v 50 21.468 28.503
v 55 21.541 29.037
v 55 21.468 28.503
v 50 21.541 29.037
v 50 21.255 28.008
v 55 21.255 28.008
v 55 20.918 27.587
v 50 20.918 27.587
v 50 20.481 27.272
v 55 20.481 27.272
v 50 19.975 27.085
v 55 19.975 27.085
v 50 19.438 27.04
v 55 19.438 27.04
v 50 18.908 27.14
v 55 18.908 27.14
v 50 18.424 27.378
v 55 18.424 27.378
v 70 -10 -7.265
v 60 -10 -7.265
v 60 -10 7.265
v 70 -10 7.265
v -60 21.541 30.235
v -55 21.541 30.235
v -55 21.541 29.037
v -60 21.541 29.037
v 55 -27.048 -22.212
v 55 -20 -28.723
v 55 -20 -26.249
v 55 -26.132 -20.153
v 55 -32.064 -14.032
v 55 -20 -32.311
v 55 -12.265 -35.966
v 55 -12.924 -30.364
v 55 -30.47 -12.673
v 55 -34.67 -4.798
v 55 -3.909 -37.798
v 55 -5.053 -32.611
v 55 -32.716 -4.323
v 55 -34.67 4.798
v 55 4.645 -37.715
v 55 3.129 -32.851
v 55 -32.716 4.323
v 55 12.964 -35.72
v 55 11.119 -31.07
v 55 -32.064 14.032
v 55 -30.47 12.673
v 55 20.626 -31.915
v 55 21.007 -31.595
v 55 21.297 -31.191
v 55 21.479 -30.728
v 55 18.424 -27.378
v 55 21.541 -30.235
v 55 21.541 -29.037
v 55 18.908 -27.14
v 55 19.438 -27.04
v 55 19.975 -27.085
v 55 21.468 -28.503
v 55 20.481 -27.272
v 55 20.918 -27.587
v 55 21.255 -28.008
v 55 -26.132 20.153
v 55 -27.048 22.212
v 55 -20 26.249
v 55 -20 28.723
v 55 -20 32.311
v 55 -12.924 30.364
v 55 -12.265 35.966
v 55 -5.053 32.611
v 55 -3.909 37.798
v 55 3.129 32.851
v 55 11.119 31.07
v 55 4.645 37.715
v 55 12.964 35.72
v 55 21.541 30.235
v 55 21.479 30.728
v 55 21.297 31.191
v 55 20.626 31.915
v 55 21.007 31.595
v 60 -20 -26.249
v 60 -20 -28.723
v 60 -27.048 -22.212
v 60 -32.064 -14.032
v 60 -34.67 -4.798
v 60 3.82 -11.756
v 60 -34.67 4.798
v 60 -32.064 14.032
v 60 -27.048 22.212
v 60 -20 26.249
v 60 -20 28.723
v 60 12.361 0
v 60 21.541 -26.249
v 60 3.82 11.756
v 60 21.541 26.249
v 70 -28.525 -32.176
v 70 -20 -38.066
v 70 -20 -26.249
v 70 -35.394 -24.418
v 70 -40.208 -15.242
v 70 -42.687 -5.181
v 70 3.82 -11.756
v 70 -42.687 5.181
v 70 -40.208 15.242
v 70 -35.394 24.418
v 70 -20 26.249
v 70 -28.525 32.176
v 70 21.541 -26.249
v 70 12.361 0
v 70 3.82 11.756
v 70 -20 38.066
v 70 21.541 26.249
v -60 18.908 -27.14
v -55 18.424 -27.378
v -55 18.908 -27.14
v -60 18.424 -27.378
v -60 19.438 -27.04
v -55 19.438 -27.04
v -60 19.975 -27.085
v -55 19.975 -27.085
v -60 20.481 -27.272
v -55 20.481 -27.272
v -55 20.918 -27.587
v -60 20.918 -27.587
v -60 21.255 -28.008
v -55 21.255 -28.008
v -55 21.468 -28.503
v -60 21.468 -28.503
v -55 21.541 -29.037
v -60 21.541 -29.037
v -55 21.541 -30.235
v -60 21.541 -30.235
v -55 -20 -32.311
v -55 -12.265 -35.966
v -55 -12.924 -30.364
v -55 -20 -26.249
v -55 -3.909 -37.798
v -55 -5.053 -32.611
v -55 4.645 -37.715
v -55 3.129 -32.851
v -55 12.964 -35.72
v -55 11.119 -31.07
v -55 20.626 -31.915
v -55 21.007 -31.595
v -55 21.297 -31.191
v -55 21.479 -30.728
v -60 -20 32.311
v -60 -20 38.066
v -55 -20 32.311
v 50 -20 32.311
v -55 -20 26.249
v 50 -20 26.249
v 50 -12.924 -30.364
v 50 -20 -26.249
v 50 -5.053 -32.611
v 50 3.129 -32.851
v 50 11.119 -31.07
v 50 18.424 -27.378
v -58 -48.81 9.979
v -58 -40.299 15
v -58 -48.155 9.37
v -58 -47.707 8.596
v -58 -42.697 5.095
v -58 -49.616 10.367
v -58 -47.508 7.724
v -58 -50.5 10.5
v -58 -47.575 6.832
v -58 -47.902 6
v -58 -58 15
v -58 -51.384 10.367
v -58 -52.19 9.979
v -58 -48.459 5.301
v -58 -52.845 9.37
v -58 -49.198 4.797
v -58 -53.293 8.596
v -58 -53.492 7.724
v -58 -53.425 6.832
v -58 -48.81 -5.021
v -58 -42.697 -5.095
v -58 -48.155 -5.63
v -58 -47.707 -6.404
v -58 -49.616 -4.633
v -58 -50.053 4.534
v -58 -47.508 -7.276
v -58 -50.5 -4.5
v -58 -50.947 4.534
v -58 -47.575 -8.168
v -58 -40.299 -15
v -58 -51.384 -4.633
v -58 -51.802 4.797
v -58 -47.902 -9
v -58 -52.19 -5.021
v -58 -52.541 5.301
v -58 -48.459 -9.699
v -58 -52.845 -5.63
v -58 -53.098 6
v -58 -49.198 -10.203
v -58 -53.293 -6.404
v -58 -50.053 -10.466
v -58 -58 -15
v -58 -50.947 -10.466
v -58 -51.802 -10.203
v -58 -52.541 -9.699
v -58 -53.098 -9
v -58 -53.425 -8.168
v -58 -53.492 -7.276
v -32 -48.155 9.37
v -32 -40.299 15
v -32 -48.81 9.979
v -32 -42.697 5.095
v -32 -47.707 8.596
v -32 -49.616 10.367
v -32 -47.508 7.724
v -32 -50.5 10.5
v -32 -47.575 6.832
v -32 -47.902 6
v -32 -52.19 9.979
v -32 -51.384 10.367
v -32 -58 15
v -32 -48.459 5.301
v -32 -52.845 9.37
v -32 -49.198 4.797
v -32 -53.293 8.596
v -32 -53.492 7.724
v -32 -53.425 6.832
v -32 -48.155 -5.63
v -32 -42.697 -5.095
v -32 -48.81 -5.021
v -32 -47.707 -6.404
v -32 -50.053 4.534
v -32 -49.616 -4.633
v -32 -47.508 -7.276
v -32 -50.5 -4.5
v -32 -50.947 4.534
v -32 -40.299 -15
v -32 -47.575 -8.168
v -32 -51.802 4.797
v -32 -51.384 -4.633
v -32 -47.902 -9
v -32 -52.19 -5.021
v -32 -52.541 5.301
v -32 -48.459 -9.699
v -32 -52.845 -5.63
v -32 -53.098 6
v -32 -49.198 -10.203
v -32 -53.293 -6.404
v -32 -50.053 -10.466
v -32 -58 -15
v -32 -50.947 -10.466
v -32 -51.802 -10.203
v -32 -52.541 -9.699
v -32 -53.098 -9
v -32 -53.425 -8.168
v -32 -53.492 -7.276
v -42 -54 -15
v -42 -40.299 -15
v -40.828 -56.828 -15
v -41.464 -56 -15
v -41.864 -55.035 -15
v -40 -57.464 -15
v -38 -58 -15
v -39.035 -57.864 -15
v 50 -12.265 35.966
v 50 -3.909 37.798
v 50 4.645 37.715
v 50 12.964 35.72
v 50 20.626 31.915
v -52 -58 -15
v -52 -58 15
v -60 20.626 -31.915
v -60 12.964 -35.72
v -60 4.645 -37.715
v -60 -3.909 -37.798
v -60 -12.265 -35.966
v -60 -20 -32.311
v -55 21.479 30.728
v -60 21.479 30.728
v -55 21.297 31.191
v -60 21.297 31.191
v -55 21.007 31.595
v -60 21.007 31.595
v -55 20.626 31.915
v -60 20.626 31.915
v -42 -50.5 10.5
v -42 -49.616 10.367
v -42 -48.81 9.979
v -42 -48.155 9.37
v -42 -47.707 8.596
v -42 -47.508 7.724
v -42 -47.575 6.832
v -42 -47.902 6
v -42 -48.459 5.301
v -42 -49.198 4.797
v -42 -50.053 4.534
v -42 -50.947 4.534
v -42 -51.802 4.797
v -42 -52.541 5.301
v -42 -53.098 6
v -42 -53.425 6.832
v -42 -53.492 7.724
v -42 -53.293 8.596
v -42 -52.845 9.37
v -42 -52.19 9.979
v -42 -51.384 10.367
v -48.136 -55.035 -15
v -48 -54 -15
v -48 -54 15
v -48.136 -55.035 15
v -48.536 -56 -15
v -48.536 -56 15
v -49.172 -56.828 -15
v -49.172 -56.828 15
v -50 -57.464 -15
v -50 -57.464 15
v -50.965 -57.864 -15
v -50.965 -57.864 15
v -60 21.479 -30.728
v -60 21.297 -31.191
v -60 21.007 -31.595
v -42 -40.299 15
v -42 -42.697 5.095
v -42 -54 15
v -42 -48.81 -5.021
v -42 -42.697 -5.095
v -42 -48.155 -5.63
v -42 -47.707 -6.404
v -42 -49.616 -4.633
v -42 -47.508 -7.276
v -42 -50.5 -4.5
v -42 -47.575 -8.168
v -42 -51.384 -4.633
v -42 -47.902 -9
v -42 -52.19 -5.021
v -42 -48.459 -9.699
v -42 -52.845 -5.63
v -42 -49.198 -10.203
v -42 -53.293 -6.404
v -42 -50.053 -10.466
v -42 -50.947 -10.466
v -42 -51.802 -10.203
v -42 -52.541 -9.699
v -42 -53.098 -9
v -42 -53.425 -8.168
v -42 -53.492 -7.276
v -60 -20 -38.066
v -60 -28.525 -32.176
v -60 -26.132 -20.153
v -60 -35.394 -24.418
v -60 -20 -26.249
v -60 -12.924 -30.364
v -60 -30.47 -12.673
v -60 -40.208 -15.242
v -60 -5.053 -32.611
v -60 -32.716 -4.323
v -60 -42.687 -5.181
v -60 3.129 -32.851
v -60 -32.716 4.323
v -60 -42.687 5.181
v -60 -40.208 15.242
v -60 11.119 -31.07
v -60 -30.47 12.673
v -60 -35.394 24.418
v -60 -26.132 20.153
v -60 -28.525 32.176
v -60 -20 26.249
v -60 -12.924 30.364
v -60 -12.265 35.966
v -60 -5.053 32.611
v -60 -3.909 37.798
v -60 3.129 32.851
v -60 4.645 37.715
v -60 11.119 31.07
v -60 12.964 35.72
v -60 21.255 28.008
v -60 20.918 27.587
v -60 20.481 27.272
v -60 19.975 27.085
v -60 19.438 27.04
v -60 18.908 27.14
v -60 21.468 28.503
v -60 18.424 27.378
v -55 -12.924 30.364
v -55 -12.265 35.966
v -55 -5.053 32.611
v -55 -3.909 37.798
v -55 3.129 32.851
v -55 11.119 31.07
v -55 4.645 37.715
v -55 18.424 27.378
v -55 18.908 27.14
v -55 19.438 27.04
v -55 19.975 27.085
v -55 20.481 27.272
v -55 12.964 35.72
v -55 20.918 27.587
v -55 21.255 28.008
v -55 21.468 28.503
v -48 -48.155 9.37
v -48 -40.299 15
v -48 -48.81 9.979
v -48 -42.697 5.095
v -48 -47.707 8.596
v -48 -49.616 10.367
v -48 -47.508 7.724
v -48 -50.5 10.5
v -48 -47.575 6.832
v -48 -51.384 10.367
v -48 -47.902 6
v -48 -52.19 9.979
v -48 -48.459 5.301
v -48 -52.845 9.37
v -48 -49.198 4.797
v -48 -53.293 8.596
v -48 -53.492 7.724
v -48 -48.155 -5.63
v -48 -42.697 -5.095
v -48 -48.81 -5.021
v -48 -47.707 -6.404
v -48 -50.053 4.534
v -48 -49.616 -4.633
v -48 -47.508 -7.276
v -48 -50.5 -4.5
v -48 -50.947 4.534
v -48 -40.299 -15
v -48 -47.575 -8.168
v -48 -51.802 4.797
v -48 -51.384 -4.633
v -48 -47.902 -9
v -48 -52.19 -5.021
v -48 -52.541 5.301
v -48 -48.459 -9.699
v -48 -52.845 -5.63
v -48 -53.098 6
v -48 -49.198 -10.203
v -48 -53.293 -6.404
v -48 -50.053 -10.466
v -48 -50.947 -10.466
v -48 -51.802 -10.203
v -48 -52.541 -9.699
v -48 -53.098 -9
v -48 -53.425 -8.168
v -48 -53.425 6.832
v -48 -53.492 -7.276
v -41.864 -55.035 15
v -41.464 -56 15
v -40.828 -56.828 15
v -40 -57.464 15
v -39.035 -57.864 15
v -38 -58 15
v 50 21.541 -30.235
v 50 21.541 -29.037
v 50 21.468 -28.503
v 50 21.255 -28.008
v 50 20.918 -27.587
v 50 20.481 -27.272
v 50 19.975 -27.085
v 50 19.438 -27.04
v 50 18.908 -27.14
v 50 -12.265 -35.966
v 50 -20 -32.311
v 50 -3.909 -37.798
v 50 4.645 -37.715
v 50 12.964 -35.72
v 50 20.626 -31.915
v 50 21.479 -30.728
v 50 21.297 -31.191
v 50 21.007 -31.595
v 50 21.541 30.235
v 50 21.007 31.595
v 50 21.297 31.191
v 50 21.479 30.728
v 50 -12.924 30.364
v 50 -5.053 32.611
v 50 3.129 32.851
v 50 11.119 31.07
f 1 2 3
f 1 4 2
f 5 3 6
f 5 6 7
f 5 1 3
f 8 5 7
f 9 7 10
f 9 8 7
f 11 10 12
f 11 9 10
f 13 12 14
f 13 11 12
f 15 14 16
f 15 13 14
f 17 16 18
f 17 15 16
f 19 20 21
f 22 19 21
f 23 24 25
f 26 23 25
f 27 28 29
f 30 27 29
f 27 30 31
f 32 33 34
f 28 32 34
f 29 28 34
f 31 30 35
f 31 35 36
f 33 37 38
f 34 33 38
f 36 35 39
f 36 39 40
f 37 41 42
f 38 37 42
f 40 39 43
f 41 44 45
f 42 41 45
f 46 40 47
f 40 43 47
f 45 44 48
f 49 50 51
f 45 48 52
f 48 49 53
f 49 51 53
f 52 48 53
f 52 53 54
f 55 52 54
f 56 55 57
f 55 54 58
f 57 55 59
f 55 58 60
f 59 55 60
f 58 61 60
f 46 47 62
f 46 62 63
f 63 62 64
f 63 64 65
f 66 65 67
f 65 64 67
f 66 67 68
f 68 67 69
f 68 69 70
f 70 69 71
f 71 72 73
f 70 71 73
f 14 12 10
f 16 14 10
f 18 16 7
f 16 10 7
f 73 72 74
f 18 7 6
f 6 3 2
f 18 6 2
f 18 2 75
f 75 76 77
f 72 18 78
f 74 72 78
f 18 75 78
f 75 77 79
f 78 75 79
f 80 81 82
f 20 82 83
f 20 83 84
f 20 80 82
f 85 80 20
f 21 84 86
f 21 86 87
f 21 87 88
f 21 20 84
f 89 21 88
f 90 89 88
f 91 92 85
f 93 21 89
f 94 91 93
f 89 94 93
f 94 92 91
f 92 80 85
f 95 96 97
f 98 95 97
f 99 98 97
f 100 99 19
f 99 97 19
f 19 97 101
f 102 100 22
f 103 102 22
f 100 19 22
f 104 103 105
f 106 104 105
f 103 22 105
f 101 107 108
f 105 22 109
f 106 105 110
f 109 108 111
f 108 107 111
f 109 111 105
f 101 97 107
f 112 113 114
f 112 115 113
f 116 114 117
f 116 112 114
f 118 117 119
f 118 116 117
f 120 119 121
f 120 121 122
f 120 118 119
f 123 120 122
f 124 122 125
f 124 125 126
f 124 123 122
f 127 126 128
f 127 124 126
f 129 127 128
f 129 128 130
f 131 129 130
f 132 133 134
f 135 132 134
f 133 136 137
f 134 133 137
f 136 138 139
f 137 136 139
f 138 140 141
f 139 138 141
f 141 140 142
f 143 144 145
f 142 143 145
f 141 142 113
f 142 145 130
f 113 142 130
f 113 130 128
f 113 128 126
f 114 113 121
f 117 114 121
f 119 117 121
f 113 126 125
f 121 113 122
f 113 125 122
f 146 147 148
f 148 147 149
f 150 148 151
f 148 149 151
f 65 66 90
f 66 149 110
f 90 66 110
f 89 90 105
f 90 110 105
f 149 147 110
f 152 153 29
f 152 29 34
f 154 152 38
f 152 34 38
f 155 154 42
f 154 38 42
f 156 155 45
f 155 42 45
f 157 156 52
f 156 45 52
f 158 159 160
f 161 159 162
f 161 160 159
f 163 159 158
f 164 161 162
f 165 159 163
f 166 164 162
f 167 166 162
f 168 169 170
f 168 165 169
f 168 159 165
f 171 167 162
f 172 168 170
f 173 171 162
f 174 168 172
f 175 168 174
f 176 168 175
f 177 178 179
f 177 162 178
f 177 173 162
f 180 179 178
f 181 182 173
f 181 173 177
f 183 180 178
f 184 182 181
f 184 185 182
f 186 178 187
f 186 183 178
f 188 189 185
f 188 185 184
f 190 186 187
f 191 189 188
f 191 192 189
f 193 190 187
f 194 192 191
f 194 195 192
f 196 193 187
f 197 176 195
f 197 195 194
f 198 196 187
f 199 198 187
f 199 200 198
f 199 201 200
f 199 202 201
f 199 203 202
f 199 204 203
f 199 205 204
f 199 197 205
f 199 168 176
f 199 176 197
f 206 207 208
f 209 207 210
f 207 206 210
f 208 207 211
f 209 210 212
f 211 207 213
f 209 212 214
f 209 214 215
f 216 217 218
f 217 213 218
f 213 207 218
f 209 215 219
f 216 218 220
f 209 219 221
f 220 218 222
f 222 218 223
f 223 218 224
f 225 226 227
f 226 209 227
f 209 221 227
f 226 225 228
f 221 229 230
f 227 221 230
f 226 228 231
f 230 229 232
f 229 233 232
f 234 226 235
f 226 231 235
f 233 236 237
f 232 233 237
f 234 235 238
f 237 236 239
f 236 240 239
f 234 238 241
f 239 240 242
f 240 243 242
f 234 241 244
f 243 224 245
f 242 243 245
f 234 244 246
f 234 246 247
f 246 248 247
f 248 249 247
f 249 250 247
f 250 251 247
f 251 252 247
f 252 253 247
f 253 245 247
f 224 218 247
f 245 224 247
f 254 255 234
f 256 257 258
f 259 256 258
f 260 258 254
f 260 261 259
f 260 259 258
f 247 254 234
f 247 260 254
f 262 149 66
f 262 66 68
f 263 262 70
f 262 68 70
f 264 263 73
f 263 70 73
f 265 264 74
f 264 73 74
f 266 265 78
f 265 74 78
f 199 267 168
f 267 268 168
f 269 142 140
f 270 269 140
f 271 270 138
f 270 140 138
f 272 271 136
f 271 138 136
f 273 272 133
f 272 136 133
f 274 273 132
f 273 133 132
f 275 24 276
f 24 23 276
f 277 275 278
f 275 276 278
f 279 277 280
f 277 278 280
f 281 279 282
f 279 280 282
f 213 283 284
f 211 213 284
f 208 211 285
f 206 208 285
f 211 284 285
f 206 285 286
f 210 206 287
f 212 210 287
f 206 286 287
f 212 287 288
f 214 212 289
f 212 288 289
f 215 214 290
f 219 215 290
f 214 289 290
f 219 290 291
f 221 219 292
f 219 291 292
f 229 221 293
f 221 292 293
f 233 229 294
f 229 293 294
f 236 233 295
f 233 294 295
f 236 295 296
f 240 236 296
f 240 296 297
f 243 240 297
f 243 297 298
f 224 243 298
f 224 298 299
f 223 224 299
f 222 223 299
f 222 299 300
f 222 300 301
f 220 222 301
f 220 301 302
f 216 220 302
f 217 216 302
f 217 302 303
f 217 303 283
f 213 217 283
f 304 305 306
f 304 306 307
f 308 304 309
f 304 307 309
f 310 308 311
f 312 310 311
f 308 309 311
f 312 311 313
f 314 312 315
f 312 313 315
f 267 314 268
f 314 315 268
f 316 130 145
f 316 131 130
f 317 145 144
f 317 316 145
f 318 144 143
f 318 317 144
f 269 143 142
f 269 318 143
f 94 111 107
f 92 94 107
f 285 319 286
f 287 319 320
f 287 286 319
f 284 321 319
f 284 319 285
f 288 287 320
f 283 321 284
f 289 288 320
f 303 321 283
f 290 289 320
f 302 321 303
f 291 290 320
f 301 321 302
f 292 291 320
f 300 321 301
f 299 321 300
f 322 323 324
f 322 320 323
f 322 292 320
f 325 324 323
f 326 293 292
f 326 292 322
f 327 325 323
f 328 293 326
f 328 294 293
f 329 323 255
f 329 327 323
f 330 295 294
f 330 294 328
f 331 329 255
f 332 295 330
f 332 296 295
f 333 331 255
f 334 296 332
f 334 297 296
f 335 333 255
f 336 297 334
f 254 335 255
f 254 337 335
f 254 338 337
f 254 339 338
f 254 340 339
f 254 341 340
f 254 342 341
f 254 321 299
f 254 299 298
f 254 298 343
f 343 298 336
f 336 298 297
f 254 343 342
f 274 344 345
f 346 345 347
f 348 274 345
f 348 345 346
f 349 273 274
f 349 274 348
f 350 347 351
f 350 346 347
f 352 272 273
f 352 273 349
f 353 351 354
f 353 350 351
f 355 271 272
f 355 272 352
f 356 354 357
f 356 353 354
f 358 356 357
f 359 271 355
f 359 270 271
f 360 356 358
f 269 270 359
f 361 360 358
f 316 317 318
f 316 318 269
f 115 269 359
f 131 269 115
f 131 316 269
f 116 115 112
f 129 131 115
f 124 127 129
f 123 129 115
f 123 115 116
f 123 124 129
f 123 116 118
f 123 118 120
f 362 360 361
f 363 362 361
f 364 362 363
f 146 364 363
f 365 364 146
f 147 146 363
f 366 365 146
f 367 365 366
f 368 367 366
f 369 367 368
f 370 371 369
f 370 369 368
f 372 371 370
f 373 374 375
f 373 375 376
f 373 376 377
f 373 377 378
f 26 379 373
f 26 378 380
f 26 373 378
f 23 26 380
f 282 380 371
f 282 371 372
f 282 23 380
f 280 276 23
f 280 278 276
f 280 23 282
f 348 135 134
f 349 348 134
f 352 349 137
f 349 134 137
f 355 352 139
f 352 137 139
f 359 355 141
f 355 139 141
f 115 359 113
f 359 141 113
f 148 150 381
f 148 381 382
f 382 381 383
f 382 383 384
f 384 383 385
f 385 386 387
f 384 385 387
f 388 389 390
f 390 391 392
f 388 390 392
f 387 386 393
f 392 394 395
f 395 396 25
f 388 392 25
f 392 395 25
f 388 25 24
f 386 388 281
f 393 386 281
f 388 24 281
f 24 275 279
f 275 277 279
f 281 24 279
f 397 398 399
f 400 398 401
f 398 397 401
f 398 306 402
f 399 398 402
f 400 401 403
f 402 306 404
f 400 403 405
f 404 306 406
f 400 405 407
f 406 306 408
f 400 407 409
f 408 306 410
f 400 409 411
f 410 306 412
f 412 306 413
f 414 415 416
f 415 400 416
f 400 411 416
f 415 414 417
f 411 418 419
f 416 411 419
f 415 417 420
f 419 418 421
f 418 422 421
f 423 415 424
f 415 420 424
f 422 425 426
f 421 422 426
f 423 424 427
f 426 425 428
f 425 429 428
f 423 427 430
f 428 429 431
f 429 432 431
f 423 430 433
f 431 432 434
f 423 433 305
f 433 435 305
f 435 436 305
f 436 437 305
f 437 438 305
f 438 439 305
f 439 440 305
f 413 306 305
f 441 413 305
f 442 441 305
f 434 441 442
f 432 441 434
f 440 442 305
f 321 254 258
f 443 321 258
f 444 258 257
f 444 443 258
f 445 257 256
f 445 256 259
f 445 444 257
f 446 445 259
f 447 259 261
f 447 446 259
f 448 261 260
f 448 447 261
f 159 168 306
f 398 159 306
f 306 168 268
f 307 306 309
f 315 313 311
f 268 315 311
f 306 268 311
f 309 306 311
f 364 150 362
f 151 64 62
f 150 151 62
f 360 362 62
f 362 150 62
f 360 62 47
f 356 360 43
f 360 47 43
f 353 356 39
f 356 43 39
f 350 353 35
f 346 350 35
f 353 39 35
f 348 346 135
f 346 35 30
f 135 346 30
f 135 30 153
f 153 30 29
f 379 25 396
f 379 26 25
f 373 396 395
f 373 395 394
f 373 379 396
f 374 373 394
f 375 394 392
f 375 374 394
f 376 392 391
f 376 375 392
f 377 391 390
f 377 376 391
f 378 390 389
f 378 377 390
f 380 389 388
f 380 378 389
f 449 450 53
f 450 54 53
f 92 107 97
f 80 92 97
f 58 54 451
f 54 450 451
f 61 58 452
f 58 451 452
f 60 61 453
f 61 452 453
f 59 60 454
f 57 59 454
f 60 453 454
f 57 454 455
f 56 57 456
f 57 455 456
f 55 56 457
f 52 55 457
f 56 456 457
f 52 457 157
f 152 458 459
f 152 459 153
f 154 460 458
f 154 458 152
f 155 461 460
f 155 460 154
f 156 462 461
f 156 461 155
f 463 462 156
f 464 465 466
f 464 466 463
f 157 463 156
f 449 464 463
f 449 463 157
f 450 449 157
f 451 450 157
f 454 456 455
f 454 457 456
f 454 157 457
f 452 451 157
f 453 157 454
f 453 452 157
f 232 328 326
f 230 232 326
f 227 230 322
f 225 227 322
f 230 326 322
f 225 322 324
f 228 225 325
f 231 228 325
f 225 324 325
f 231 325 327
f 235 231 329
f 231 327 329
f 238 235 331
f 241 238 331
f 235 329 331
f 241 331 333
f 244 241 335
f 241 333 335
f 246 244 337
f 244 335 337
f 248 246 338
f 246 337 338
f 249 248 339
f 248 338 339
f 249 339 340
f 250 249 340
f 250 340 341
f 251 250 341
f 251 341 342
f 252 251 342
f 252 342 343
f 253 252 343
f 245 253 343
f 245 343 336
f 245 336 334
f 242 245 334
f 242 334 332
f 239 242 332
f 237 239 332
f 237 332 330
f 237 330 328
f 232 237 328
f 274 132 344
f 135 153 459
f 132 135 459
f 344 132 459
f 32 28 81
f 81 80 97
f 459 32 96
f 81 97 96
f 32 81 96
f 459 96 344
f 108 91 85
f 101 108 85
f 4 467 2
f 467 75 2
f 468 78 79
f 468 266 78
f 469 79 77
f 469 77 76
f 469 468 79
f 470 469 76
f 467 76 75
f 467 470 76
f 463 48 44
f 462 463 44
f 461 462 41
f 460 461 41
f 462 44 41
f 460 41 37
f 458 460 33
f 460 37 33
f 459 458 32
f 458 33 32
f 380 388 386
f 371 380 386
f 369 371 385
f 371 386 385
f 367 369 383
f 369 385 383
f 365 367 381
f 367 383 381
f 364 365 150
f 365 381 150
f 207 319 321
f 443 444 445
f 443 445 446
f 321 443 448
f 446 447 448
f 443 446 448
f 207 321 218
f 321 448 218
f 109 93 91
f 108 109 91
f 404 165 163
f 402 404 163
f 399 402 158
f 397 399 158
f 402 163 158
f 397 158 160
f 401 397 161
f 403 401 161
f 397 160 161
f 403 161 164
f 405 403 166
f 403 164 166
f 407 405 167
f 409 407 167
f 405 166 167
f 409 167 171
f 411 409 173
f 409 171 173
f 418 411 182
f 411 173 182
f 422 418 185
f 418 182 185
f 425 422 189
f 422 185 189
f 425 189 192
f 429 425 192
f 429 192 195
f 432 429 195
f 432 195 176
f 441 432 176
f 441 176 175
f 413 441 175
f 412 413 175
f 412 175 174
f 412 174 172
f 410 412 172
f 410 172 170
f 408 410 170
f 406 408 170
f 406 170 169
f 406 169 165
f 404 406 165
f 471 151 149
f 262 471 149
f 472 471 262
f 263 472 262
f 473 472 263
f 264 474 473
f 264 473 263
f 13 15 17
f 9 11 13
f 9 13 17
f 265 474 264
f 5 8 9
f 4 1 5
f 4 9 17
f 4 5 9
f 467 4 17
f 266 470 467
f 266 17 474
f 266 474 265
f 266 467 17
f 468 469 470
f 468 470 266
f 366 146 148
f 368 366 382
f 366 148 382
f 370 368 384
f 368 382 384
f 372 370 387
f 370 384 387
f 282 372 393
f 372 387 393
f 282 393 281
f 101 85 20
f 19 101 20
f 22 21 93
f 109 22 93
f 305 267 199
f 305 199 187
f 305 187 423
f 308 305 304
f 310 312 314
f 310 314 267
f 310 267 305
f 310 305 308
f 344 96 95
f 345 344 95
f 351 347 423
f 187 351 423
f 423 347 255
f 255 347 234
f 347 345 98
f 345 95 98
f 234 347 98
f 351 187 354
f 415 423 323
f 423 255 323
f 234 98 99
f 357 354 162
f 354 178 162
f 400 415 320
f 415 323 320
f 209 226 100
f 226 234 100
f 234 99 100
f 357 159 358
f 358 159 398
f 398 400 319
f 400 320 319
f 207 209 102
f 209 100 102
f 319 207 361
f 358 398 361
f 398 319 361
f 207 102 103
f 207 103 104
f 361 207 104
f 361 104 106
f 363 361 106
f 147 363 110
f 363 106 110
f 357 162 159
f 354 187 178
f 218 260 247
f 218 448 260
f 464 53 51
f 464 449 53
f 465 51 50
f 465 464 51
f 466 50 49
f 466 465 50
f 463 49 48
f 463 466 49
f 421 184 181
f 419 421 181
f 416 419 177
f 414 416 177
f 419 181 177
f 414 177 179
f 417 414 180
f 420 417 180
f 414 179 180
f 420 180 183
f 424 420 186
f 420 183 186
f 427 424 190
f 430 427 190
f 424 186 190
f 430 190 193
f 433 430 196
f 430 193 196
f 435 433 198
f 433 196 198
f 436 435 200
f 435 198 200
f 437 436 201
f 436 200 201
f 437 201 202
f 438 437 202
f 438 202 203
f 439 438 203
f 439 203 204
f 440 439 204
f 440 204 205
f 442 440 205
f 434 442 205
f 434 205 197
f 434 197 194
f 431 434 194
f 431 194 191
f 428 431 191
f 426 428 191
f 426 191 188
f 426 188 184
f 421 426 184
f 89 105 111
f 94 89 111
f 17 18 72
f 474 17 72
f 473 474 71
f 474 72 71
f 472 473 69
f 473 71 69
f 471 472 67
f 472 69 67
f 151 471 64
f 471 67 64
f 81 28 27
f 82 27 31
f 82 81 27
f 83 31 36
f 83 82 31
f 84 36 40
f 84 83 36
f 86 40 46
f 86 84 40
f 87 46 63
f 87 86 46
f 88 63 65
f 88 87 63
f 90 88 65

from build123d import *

# Parameters (mm, degrees)
BOSS_EXTRUDE1_DEPTH      = 60
BOSS_EXTRUDE2_START      = -5
BOSS_EXTRUDE2_DEPTH      = 5
BOSS_EXTRUDE3_START      = 10
BOSS_EXTRUDE3_DEPTH      = 10
BOSS_EXTRUDE4_DEPTH      = 15
BOSS_EXTRUDE4_2_DEPTH    = 15
BOSS_EXTRUDE6_REACH      = 104.54
BOSS_EXTRUDE6_END_RADIUS = 43
SKETCH5_W                = 10
SKETCH5_H                = 30
CUT_EXTRUDE1_REACH       = 147.592
SKETCH6_R                = 3
SKETCH7_R                = 35
CUT_EXTRUDE2_DEPTH       = 5
LPATTERN1_COUNT          = 2
LPATTERN1_PITCH          = 110
FILLET1_R                = 2
CUT_EXTRUDE3_REACH       = 140.611


with BuildPart() as part:
    # Sketch1 → Boss-Extrude1 (new, symmetric)
    with BuildSketch(Plane(origin=(0, 0, 0), x_dir=(0, 0, -1), z_dir=(1, 0, 0))):
        with BuildLine():
            Line((-38.065732621, -20), (-26.248809497, -20))
            ThreePointArc((-26.248809497, -20), (0, -33), (26.248809497, -20))
            Line((26.248809497, -20), (38.065732621, -20))
            ThreePointArc((38.065732621, -20), (0, -43), (-38.065732621, -20))
        make_face()
    extrude(amount=BOSS_EXTRUDE1_DEPTH, both=True)

    # Sketch2 → Boss-Extrude2 (add)
    with BuildSketch(Plane(origin=(60, 0, 0), x_dir=(0, 0, -1), z_dir=(1, 0, 0)).offset(BOSS_EXTRUDE2_START)):
        with BuildLine():
            Line((-31.304951685, 21.540659229), (-25, 21.540659229))
            ThreePointArc((-25, 21.540659229), (0, -33), (25, 21.540659229))
            Line((25, 21.540659229), (31.304951685, 21.540659229))
            ThreePointArc((31.304951685, 21.540659229), (0, -38), (-31.304951685, 21.540659229))
        make_face()
    boss_extrude2 = extrude(amount=-BOSS_EXTRUDE2_DEPTH)

    # Sketch3 → Boss-Extrude3 (add)
    with BuildSketch(Plane(origin=(60, 0, 0), x_dir=(0, 0, -1), z_dir=(1, 0, 0)).offset(BOSS_EXTRUDE3_START)):
        with BuildLine():
            Line((-26.248809497, -20), (-26.248809497, 21.540659229))
            Line((-26.248809497, 21.540659229), (26.248809497, 21.540659229))
            Line((26.248809497, 21.540659229), (26.248809497, -20))
            Line((26.248809497, -20), (38.065732621, -20))
            ThreePointArc((38.065732621, -20), (0, -43), (-38.065732621, -20))
            Line((-38.065732621, -20), (-26.248809497, -20))
        make_face()
    extrude(amount=-BOSS_EXTRUDE3_DEPTH)



with BuildPart() as body_2:
    # Sketch4 → Boss-Extrude4 (new, symmetric)
    with BuildSketch(Plane.XY):
        with BuildLine():
            Line((-48, -43), (-48, -54))
            ThreePointArc((-48, -54), (-49.171572875, -56.828427125), (-52, -58))
            Line((-52, -58), (-58, -58))
            Line((-58, -58), (-58, -43))
            Line((-58, -43), (-48, -43))
        make_face()
    extrude(amount=BOSS_EXTRUDE4_DEPTH, both=True)


with BuildPart() as body_3:
    # Sketch4 → Boss-Extrude4 2 (new, symmetric)
    with BuildSketch(Plane.XY):
        with BuildLine():
            Line((-32, -43), (-42, -43))
            Line((-42, -43), (-42, -54))
            ThreePointArc((-42, -54), (-40.828427125, -56.828427125), (-38, -58))
            Line((-38, -58), (-32, -58))
            Line((-32, -58), (-32, -43))
        make_face()
    extrude(amount=BOSS_EXTRUDE4_2_DEPTH, both=True)


with BuildPart() as part_1:
    add(part.part)

    add(body_2.part)  # Boss-Extrude6 merges body 2

    add(body_3.part)  # Boss-Extrude6 merges body 3
    # Boss-Extrude6: up to this cylinder (the profile starts outside it)
    boss_extrude6_end = Plane(origin=(-45, 0, 0), z_dir=(-1, 0, 0)) * Cylinder(BOSS_EXTRUDE6_END_RADIUS, 312.08, mode=Mode.PRIVATE)
    # Sketch5 → Boss-Extrude6 (add, up to the surface)
    with BuildSketch(Plane(origin=(0, -43, 0), x_dir=(1, 0, 0), z_dir=(0, 1, 0)), mode=Mode.PRIVATE) as boss_extrude6_sk1:
        with Locations((-37, 0)):
            Rectangle(SKETCH5_W, SKETCH5_H)
    boss_extrude6_tool1 = extrude(boss_extrude6_sk1.sketch, amount=BOSS_EXTRUDE6_REACH, mode=Mode.PRIVATE) - boss_extrude6_end
    add(boss_extrude6_tool1.solids().sort_by_distance((-37, -43, 0))[0])
    add(boss_extrude6_tool1.solids().sort_by_distance((-37, -43, 0))[1])
    # Sketch5 → Boss-Extrude6 (add, up to the surface)
    with BuildSketch(Plane(origin=(0, -43, 0), x_dir=(1, 0, 0), z_dir=(0, 1, 0)), mode=Mode.PRIVATE) as boss_extrude6_sk2:
        with Locations((-53, 0)):
            Rectangle(SKETCH5_W, SKETCH5_H)
    boss_extrude6_tool2 = extrude(boss_extrude6_sk2.sketch, amount=BOSS_EXTRUDE6_REACH, mode=Mode.PRIVATE) - boss_extrude6_end
    add(boss_extrude6_tool2.solids().sort_by_distance((-53, -43, 0))[0])
    add(boss_extrude6_tool2.solids().sort_by_distance((-53, -43, 0))[1])

    # Cut-Extrude1: up to this face of the body (flat: up to its plane)
    cut_extrude1_end = Plane(part_1.part.faces().sort_by_distance((-32, -50.035411039, 0))[0])
    # Sketch6 → Cut-Extrude1 (cut, up to the picked face)
    with BuildSketch(Plane.ZY.offset(58), mode=Mode.PRIVATE) as cut_extrude1_sk1:
        with Locations((-7.5, -50.5)):
            Circle(SKETCH6_R)
    cut_extrude1_tool1 = split(extrude(cut_extrude1_sk1.sketch, amount=-CUT_EXTRUDE1_REACH, mode=Mode.PRIVATE), bisect_by=cut_extrude1_end, keep=Keep.BOTH, mode=Mode.PRIVATE)
    # Sketch6 → Cut-Extrude1 (cut, up to the picked face)
    with BuildSketch(Plane.ZY.offset(58), mode=Mode.PRIVATE) as cut_extrude1_sk2:
        with Locations((7.5, -50.5)):
            Circle(SKETCH6_R)
    cut_extrude1_tool2 = split(extrude(cut_extrude1_sk2.sketch, amount=-CUT_EXTRUDE1_REACH, mode=Mode.PRIVATE), bisect_by=cut_extrude1_end, keep=Keep.BOTH, mode=Mode.PRIVATE)
    add(cut_extrude1_tool1.solids().sort_by(Axis((-58, -50.5, -7.5), (1, 0, 0)))[0], mode=Mode.SUBTRACT)
    add(cut_extrude1_tool2.solids().sort_by(Axis((-58, -50.5, 7.5), (1, 0, 0)))[0], mode=Mode.SUBTRACT)

    # Sketch7 → Cut-Extrude2 (cut)
    with BuildSketch(Plane.ZY.offset(-60)):
        Circle(SKETCH7_R)
    extrude(amount=CUT_EXTRUDE2_DEPTH, mode=Mode.SUBTRACT)

    # LPattern1: Boss-Extrude2 ×2
    with Locations(*[(-i * LPATTERN1_PITCH, 0, 0) for i in range(1, LPATTERN1_COUNT)]):
        add(boss_extrude2)

    # Fillet1
    fillet1_edges = [part_1.edges().sort_by_distance(p)[0] for p in [
        (52.5, 21.540659229, 25),
        (52.5, 21.540659229, -31.304951685),
        (52.5, 21.540659229, -25),
        (-57.5, 21.540659229, 25),
        (-57.5, 21.540659229, -31.304951685),
        (-57.5, 21.540659229, -25),
        (-57.5, 21.540659229, 31.304951685),
        (52.5, 21.540659229, 31.304951685),
    ]]
    fillet(fillet1_edges, radius=FILLET1_R)

    # Sketch8 → Cut-Extrude3 (cut, up to next)
    with BuildSketch(Plane.ZY.offset(-60), mode=Mode.PRIVATE) as cut_extrude3_sk1:
        Polygon((0, 12.360679775), (-11.755705046, 3.819660113), (-7.26542528, -10), (7.26542528, -10), (11.755705046, 3.819660113), align=None)
    cut_extrude3_tool1 = extrude(cut_extrude3_sk1.sketch, amount=-CUT_EXTRUDE3_REACH, mode=Mode.PRIVATE) & part_1.part
    add(cut_extrude3_tool1.solids().sort_by_distance((60, 0, 0))[0], mode=Mode.SUBTRACT)


solid = part_1.part
